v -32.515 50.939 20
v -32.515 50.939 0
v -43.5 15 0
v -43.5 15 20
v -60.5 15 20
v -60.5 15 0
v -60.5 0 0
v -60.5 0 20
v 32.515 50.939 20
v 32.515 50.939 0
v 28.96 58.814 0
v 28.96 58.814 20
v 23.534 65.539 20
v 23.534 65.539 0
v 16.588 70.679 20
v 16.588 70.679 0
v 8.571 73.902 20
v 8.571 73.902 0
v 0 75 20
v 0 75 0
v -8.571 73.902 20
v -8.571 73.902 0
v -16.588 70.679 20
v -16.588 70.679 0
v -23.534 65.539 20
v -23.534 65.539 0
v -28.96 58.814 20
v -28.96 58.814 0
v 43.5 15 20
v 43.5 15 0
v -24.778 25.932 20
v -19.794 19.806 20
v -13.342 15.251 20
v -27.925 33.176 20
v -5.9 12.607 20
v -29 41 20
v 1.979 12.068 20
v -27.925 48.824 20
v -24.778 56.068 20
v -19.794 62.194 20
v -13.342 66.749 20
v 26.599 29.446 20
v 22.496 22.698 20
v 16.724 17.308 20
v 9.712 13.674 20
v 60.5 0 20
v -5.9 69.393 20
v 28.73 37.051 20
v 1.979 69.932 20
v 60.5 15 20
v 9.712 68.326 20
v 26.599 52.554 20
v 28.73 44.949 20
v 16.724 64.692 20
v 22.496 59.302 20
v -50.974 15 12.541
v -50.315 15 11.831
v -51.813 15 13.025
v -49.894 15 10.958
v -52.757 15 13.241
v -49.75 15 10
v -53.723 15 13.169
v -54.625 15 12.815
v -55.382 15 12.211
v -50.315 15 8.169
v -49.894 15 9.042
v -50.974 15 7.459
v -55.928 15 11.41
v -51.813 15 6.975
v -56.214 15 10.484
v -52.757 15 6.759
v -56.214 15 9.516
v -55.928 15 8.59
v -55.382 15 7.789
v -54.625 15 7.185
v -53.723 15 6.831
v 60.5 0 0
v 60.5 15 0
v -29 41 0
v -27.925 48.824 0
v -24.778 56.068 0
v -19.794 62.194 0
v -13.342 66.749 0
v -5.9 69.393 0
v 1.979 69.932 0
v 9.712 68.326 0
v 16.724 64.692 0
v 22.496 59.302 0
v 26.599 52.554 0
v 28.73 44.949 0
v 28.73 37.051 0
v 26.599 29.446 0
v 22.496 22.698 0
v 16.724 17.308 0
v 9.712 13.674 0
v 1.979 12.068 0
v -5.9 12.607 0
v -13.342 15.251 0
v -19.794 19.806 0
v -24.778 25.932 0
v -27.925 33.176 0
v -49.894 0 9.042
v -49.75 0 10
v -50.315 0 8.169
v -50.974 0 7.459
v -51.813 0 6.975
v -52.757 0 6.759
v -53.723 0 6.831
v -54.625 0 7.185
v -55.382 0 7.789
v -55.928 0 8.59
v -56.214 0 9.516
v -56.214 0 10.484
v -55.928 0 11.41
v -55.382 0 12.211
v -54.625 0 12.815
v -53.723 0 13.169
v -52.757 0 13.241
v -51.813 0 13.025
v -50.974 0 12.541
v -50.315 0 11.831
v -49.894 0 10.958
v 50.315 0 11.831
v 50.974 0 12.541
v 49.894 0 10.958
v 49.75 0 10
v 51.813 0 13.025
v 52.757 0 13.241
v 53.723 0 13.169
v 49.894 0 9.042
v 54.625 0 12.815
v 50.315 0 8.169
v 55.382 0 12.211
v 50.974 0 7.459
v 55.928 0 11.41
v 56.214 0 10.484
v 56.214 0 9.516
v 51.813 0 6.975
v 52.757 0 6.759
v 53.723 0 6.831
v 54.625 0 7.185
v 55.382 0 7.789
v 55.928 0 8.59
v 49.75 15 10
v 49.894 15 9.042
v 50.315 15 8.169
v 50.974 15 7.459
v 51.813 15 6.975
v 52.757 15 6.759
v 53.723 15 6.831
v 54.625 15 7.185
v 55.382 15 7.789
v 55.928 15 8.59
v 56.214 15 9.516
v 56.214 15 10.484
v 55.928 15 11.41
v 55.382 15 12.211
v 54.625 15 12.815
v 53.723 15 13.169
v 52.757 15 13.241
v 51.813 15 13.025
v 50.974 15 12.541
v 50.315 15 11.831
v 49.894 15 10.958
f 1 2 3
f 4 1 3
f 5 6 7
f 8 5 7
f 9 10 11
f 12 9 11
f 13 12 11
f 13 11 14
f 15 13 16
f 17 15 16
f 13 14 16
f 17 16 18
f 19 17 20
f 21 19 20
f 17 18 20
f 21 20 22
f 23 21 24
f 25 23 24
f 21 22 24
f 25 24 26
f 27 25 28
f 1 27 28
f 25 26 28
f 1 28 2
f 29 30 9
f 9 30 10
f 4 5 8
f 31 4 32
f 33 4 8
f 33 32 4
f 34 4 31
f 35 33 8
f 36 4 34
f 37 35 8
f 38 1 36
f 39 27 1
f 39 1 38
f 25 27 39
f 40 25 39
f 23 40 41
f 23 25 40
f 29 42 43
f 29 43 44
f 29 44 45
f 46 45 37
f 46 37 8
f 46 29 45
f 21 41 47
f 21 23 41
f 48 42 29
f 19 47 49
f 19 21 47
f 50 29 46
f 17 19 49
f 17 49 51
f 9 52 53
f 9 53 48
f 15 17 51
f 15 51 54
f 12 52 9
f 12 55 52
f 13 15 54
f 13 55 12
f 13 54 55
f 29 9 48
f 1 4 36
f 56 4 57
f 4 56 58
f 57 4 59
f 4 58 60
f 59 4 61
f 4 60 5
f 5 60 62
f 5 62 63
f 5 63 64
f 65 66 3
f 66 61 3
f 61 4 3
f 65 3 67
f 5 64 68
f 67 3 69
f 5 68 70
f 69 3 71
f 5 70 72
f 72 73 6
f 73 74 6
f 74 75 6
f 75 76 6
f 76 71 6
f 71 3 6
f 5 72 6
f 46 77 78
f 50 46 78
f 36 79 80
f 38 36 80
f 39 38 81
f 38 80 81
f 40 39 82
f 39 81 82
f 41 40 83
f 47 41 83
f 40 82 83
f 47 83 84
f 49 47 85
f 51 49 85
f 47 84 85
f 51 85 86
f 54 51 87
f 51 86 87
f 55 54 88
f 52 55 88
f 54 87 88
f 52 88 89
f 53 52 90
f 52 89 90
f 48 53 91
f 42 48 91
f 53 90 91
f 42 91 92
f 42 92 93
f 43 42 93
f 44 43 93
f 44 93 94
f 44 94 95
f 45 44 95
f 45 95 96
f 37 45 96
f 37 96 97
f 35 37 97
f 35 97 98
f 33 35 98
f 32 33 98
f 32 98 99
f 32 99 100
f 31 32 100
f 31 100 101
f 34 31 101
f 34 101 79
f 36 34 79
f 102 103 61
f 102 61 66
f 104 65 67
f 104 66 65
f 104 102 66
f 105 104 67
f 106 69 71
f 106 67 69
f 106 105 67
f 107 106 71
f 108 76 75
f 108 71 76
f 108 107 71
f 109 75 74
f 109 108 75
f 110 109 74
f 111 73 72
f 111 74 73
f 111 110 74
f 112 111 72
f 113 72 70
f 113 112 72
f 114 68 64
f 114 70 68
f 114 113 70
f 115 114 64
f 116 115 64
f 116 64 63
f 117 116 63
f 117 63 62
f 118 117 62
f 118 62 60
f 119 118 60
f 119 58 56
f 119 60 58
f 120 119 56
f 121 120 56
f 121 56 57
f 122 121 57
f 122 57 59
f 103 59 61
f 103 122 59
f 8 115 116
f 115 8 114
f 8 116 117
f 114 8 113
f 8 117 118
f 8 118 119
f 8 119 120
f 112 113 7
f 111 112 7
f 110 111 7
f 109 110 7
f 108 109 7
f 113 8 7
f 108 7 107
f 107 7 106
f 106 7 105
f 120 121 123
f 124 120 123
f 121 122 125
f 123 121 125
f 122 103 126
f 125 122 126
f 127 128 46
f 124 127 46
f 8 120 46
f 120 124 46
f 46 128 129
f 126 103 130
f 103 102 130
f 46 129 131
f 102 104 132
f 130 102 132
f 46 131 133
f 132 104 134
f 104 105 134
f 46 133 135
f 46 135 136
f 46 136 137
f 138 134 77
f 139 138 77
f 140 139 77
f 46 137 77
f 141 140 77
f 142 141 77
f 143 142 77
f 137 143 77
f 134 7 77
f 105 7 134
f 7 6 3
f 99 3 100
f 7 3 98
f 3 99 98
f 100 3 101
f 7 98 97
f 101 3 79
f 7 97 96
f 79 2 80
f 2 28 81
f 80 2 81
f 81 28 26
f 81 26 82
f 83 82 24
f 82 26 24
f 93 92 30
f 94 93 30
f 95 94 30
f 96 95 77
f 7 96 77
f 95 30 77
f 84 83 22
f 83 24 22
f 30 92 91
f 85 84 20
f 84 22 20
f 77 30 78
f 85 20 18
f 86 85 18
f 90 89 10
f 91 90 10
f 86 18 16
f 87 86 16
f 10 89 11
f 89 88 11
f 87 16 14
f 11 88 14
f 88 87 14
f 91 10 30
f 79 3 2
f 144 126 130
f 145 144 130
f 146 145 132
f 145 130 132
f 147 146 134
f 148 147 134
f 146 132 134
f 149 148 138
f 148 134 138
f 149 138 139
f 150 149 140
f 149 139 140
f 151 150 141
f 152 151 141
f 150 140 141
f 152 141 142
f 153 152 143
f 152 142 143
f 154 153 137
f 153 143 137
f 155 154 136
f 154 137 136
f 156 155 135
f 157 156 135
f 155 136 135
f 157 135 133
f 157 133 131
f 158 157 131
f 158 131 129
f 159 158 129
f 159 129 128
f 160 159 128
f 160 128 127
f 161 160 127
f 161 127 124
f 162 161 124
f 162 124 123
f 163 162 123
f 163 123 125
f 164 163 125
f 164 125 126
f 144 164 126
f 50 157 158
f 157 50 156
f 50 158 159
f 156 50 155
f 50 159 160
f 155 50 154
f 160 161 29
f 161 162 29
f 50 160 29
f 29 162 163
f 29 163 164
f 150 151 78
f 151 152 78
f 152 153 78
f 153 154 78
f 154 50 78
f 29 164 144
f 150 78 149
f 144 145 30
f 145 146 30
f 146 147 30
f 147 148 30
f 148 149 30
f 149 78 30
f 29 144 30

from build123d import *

# Parameters (mm, degrees)
BOSS_EXTRUDE1_DEPTH     = 20
SKETCH2_R               = 29
CUT_EXTRUDE1_DEPTH      = 1
CUT_EXTRUDE1_DEPTH_BACK = 21
CUT_EXTRUDE2_START      = -16
SKETCH3_R               = 3.25
CUT_EXTRUDE2_DEPTH      = 77


with BuildPart() as part:
    # Sketch1 → Boss-Extrude1 (new body)
    with BuildSketch(Plane.XY):
        with BuildLine():
            Line((-60.5, 0), (60.5, 0))
            Line((60.5, 0), (60.5, 15))
            Line((60.5, 15), (43.5, 15))
            Line((43.5, 15), (32.514998433, 50.938555071))
            ThreePointArc((32.514998433, 50.938555071), (0, 75), (-32.514998433, 50.938555071))
            Line((-32.514998433, 50.938555071), (-43.5, 15))
            Line((-43.5, 15), (-60.5, 15))
            Line((-60.5, 15), (-60.5, 0))
        make_face()
    extrude(amount=BOSS_EXTRUDE1_DEPTH)

    # Sketch2 → Cut-Extrude1 (cut, two sides)
    with BuildSketch(Plane(origin=(0, 0, 0), x_dir=(-1, 0, 0), z_dir=(0, 0, -1))) as cut_extrude1_sk:
        with Locations((0, 41)):
            Circle(SKETCH2_R)
    extrude(amount=CUT_EXTRUDE1_DEPTH, mode=Mode.SUBTRACT)
    extrude(cut_extrude1_sk.sketch, amount=-CUT_EXTRUDE1_DEPTH_BACK, mode=Mode.SUBTRACT)

    # Sketch3 → Cut-Extrude2 (cut)
    with BuildSketch(Plane(origin=(0, 15, 0), x_dir=(1, 0, 0), z_dir=(0, 1, 0)).offset(CUT_EXTRUDE2_START)):
        with Locations((-53, -10)):
            Circle(SKETCH3_R)
    cut_extrude2 = extrude(amount=CUT_EXTRUDE2_DEPTH, mode=Mode.SUBTRACT)

    # Mirror1: Cut-Extrude2 across plane
    add(cut_extrude2.mirror(Plane(origin=(0, 0, 0), x_dir=(0, 0, 1), z_dir=(1, 0, 0))), mode=Mode.SUBTRACT)


solid = part.part
